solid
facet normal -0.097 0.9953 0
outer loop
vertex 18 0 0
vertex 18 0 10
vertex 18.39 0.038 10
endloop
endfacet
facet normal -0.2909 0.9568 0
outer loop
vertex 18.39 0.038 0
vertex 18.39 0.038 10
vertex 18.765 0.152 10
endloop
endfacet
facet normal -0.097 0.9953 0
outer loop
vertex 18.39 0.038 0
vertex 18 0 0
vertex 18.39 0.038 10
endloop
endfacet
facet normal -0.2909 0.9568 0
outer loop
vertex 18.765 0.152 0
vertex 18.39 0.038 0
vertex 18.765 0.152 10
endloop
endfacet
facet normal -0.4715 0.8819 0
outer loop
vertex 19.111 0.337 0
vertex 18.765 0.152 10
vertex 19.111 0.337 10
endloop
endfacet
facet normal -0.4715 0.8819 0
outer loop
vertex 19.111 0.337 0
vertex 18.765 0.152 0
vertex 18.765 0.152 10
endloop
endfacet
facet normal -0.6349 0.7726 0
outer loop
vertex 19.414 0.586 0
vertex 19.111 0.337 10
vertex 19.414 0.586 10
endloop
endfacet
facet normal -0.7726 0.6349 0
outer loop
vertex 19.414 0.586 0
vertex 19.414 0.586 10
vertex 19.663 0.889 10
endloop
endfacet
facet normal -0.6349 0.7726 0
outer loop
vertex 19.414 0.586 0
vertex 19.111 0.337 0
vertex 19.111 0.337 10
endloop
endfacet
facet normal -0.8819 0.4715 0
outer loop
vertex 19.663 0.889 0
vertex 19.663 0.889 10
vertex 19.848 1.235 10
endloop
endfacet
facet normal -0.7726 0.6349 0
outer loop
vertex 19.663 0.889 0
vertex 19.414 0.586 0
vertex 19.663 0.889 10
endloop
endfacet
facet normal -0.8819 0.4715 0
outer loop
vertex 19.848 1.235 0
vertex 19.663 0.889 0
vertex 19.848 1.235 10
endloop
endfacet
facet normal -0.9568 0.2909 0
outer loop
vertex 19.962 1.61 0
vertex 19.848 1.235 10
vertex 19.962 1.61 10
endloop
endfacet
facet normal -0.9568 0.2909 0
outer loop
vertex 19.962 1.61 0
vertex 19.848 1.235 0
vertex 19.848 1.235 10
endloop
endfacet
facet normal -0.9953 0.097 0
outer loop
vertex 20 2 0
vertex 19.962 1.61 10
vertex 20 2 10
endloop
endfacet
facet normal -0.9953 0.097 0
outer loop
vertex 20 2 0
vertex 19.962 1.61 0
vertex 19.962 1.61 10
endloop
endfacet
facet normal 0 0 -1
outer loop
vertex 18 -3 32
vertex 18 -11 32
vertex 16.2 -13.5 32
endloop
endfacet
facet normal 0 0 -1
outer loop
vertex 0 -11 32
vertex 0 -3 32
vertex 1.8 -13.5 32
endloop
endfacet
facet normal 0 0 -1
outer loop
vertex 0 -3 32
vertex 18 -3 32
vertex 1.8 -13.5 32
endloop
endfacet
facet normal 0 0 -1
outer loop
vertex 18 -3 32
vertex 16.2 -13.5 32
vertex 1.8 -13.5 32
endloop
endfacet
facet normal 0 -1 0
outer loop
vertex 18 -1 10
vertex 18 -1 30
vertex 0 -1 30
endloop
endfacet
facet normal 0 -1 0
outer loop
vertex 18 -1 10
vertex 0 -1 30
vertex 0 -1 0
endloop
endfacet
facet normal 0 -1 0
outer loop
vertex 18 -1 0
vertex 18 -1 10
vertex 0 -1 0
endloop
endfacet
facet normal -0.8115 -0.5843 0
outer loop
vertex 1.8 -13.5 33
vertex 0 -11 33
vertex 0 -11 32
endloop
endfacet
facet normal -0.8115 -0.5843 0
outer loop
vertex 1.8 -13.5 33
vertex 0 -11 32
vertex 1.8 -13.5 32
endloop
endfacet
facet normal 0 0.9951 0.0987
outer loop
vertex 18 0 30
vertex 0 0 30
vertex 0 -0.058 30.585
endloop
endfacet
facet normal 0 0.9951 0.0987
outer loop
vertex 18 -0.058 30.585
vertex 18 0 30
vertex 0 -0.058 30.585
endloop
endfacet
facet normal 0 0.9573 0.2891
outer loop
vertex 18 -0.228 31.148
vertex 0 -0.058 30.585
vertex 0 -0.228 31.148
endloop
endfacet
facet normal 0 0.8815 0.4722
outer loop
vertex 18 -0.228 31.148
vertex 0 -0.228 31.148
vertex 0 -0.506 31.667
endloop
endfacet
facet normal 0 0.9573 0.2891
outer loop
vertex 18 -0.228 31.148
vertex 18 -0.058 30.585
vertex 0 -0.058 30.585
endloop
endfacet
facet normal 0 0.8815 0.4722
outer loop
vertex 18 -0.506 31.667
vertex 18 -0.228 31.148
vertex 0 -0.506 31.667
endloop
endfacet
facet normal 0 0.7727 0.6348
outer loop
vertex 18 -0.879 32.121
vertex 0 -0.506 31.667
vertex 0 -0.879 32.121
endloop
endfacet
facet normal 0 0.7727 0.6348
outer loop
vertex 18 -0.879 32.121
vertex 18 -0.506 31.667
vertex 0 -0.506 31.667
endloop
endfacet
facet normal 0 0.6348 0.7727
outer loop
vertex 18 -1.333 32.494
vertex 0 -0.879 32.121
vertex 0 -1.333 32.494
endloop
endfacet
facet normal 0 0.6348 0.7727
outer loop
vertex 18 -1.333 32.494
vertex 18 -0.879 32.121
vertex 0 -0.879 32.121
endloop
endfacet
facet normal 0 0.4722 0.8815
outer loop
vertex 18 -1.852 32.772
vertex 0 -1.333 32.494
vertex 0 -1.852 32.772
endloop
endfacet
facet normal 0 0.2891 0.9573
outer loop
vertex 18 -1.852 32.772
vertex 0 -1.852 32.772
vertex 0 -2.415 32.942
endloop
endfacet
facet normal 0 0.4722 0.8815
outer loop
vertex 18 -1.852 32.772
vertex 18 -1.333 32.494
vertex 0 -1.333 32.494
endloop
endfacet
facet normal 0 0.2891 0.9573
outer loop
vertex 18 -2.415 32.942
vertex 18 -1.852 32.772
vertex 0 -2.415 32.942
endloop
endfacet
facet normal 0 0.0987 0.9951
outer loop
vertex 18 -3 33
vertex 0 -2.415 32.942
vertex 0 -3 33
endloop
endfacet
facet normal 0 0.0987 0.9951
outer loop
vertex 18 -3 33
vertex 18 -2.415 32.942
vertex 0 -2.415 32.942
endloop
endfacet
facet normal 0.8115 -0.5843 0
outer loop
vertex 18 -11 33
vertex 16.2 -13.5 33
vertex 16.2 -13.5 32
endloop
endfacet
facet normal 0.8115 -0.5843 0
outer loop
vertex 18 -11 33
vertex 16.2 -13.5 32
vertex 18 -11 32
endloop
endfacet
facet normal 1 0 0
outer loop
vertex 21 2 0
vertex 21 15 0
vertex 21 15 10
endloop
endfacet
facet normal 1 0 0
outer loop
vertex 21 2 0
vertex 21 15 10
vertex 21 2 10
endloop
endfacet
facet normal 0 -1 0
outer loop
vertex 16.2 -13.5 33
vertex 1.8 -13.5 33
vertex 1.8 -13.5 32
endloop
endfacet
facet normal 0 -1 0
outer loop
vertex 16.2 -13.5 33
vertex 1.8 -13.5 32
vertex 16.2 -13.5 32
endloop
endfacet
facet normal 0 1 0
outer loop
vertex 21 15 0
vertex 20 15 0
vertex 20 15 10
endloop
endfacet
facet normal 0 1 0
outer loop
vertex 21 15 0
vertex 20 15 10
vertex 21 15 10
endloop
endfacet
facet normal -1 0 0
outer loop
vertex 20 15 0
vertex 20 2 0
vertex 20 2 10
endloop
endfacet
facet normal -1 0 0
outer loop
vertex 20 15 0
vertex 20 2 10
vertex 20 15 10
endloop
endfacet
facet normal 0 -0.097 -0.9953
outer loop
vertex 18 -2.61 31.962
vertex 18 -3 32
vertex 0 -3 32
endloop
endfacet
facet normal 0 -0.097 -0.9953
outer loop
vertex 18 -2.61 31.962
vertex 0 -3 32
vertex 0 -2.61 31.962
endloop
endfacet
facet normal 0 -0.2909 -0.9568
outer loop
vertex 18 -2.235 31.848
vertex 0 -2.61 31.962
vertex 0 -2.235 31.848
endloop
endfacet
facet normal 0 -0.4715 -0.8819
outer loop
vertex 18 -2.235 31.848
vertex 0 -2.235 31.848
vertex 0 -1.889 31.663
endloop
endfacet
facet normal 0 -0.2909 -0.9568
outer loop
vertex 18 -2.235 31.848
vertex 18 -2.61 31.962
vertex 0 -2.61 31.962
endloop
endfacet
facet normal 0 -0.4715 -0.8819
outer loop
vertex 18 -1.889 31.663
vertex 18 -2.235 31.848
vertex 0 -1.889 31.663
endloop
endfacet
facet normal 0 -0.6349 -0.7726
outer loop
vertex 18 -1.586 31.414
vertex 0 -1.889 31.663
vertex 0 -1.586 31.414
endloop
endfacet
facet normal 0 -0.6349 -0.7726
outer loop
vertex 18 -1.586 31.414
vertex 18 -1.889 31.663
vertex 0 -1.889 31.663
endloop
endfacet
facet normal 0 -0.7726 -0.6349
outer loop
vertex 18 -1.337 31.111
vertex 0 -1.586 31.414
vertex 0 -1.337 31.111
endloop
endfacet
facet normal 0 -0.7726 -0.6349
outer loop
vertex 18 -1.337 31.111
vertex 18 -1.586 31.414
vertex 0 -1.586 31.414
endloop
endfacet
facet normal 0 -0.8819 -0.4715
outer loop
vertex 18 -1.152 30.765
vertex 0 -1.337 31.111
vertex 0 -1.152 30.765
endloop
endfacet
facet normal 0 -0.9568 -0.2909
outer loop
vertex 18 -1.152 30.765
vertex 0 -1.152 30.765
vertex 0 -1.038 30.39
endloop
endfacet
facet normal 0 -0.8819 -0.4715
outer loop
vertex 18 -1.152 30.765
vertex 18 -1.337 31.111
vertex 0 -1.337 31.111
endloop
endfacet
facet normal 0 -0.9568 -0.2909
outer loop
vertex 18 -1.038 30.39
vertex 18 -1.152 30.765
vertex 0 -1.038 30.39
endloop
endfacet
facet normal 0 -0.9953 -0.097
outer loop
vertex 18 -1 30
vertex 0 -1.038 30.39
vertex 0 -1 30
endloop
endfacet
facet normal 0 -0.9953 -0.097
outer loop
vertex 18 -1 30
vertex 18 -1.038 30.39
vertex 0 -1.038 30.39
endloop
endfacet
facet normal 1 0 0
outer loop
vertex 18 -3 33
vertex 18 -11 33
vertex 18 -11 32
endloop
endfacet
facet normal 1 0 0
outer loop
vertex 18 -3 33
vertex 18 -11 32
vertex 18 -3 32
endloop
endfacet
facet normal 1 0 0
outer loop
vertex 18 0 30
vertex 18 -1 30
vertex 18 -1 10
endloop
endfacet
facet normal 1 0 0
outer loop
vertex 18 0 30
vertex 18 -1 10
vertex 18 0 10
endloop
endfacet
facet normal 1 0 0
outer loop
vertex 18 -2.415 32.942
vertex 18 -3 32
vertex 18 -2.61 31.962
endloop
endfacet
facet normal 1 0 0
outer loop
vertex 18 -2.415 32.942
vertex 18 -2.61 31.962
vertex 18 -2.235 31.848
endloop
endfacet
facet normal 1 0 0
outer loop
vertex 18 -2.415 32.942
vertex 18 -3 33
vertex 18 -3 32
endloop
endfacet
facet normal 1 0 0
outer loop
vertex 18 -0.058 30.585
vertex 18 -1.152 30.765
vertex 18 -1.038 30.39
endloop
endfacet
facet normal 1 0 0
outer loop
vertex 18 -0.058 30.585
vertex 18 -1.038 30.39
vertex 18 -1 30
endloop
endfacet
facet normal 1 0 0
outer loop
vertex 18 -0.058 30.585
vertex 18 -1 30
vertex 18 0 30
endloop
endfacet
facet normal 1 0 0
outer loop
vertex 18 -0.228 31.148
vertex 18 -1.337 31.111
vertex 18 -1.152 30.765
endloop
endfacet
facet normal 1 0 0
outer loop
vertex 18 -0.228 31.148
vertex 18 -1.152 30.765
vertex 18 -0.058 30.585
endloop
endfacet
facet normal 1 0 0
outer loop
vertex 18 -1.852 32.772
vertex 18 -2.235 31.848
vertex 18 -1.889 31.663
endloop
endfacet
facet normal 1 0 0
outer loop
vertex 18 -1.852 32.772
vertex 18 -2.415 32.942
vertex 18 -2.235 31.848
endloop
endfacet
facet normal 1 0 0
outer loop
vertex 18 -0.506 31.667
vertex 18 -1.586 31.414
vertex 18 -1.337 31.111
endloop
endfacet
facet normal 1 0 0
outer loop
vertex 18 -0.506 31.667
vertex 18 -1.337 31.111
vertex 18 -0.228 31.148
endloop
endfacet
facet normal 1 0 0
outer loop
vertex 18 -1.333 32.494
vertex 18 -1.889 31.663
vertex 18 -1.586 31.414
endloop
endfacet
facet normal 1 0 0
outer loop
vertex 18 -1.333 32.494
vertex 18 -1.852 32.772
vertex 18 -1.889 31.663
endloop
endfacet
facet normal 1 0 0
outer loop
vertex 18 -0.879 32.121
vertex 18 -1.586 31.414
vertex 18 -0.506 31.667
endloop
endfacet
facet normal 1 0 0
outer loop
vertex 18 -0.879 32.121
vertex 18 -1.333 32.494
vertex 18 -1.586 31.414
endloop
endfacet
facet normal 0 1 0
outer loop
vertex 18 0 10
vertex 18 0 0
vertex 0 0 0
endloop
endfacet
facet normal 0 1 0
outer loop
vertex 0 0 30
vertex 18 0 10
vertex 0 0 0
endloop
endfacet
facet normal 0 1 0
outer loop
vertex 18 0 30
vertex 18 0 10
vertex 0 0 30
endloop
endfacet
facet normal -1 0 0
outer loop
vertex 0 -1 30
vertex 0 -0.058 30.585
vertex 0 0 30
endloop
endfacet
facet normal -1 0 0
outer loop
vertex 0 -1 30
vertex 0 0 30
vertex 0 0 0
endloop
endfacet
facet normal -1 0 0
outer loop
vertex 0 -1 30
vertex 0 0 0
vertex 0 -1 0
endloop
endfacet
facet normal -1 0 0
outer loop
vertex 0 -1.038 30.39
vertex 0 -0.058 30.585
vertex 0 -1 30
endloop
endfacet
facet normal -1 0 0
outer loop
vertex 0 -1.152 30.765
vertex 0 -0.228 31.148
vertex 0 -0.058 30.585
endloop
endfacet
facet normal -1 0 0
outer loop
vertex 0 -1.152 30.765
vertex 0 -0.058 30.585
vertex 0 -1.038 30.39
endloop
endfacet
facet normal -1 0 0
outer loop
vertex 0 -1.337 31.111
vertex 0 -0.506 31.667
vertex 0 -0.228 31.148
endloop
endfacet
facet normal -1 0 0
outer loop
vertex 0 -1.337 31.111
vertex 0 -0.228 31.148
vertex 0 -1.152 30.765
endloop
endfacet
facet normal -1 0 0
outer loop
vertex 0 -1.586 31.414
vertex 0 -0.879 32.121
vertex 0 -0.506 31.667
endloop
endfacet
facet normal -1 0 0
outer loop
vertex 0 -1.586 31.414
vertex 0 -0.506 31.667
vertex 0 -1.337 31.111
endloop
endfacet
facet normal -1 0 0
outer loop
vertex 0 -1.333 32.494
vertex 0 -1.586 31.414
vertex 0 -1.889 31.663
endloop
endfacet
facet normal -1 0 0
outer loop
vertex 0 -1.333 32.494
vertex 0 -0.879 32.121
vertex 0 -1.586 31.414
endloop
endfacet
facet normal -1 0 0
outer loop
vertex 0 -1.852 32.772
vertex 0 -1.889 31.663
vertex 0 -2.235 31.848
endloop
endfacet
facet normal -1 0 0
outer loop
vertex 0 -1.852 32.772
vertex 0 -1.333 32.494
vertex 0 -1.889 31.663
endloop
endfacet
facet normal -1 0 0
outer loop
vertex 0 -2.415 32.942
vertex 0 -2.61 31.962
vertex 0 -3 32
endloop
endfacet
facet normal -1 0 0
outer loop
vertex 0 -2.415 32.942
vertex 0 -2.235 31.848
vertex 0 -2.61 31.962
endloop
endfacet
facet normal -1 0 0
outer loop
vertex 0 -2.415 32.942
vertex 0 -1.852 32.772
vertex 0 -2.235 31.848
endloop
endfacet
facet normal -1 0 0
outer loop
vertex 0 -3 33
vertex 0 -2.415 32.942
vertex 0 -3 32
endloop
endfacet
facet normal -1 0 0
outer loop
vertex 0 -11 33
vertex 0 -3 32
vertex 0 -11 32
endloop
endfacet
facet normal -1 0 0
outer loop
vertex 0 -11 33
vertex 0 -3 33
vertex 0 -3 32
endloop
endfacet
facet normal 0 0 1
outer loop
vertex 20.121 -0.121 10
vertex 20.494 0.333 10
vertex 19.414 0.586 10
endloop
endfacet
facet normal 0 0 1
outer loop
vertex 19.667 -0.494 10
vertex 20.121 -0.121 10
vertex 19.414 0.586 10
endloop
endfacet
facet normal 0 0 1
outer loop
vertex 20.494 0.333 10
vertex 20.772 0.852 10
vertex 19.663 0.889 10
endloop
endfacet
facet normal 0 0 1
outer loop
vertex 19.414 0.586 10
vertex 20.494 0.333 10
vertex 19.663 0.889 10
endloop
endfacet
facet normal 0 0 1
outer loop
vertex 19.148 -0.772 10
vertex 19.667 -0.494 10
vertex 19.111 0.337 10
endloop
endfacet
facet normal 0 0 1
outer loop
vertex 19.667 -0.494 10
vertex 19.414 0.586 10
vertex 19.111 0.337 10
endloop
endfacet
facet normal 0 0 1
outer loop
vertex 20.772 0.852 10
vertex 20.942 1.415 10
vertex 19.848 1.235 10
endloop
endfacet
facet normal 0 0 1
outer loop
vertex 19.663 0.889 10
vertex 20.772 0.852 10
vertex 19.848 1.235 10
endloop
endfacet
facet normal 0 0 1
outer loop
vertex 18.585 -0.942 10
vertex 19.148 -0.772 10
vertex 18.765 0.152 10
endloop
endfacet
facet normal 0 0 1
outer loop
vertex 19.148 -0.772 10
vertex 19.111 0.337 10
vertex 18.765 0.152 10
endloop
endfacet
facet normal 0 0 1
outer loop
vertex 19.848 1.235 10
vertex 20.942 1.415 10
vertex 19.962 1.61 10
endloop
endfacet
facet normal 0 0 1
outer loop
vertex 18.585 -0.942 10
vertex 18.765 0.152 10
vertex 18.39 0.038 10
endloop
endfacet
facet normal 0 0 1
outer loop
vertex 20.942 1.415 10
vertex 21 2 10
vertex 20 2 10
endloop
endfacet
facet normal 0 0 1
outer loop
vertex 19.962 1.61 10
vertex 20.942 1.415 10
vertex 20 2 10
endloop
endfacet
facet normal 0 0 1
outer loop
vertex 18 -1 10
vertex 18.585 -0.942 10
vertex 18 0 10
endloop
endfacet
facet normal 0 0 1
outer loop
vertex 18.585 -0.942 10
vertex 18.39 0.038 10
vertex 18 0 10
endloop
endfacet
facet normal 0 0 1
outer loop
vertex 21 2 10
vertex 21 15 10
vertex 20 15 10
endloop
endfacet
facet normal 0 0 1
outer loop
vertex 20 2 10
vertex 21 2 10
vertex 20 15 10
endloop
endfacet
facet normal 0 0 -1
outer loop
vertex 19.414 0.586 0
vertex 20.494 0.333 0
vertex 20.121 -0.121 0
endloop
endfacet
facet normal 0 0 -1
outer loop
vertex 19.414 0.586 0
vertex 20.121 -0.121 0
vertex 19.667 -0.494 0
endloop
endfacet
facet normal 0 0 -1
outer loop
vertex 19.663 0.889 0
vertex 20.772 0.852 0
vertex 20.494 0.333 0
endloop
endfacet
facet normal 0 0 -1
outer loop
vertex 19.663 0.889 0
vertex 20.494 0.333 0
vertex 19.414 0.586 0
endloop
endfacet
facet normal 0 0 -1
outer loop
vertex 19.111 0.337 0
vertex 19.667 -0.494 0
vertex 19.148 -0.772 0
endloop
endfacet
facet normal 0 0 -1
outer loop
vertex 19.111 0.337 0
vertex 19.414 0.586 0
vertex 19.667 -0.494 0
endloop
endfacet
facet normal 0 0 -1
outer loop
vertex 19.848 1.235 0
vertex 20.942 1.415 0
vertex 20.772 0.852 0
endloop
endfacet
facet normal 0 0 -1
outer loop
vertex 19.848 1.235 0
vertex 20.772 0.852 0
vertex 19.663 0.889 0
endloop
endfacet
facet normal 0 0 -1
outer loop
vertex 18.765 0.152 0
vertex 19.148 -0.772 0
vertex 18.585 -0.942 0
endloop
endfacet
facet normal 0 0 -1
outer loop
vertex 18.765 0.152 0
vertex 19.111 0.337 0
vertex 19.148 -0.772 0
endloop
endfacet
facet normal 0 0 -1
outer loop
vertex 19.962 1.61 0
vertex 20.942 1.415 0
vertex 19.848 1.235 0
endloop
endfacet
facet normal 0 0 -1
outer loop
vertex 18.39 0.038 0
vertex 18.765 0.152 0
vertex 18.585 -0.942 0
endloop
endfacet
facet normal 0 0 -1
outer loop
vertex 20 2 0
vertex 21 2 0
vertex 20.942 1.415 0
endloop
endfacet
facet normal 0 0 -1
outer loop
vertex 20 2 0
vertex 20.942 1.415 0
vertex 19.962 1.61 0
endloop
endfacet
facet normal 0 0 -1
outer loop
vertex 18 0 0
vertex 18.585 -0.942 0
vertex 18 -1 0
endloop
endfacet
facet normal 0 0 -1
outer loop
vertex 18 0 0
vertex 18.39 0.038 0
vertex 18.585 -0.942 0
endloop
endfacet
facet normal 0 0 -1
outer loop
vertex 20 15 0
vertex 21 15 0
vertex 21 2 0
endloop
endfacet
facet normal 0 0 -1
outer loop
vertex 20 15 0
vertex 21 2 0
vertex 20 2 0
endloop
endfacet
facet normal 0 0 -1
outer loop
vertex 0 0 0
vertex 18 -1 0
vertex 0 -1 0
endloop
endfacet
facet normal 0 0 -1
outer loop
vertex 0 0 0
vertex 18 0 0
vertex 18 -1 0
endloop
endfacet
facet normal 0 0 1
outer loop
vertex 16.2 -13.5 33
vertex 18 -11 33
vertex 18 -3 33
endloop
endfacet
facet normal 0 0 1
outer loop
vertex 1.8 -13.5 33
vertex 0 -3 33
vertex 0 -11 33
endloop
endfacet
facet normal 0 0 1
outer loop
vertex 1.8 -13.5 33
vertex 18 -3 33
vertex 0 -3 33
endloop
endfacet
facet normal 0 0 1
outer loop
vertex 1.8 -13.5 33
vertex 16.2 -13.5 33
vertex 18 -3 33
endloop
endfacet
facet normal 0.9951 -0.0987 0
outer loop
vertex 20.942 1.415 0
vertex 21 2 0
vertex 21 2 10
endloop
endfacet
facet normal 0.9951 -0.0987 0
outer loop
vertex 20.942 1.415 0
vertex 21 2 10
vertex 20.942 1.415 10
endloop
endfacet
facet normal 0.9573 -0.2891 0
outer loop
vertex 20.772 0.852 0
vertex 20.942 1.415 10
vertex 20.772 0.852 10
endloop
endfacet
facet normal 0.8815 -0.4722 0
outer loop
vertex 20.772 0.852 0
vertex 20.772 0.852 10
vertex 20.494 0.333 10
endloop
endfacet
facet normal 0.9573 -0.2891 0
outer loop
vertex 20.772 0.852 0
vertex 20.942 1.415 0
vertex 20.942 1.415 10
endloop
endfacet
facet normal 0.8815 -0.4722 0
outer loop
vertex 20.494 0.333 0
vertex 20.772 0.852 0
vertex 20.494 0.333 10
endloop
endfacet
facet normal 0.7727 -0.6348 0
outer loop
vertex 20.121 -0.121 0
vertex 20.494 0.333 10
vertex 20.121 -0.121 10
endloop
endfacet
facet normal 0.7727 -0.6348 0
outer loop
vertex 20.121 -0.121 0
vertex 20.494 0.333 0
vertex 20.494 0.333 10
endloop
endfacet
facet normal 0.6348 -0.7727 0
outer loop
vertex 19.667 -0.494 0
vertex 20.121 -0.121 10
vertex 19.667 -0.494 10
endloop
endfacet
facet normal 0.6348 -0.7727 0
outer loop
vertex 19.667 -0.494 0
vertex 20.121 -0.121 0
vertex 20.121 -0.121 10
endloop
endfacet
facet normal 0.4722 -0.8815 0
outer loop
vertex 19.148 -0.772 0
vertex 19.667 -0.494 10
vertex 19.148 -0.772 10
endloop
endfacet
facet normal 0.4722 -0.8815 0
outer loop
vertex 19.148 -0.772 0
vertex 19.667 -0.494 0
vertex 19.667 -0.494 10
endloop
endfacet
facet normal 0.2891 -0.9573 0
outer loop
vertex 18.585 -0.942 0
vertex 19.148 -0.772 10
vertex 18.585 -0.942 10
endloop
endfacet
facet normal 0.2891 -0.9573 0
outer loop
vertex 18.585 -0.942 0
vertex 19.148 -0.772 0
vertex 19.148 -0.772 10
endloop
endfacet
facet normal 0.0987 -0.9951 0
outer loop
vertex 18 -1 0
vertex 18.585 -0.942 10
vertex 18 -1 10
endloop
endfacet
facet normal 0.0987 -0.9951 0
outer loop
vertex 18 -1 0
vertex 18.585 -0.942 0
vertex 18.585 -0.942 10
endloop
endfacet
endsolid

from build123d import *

# Parameters (mm, degrees)
SM_BASE_FLANGE_1_DEPTH      = 10
SM_EDGE_FLANGE_2_DEPTH      = 18
SM_START                    = 1
SM_EDGE_FLANGE_2_FLAT_DEPTH = 1


# Sheet-metal steps are written as plain solids
with BuildPart() as part:
    # Sketch 1 → 基体-法兰1 (new body)
    with BuildSketch(Plane.XY):
        with BuildLine():
            Line((0, 0), (18, 0))
            ThreePointArc((18, 0), (19.414213562, 0.585786438), (20, 2))
            Line((20, 2), (20, 15))
            Line((20, 15), (21, 15))
            Line((21, 15), (21, 2))
            ThreePointArc((21, 2), (20.121320344, -0.121320344), (18, -1))
            Line((18, -1), (0, -1))
            Line((0, -1), (0, 0))
        make_face()
    extrude(amount=SM_BASE_FLANGE_1_DEPTH)

    # 边线-法兰2 bend section (across the edge) → 边线-法兰2 (add)
    with BuildSketch(Plane(origin=(18, -1, 32), x_dir=(0, 0, -1), z_dir=(-1, 0, 0))):
        with BuildLine():
            Line((-1, 2), (0, 2))
            ThreePointArc((0, 2), (0.585786438, 0.585786438), (2, 0))
            Line((2, 0), (22, 0))
            Line((22, 0), (22, -1))
            Line((22, -1), (2, -1))
            ThreePointArc((2, -1), (-0.121320344, -0.121320344), (-1, 2))
        make_face()
    extrude(amount=SM_EDGE_FLANGE_2_DEPTH)

    # 边线-法兰2 profile (on flange) → 边线-法兰2 flat (add)
    with BuildSketch(Plane(origin=(0, -1, 32), x_dir=(-1, 0, 0), z_dir=(0, 0, 1)).offset(SM_START)):
        Polygon((0, 2), (0, 10), (-1.8, 12.5), (-16.2, 12.5), (-18, 10), (-18, 2), align=None)
    extrude(amount=-SM_EDGE_FLANGE_2_FLAT_DEPTH)


solid = part.part
